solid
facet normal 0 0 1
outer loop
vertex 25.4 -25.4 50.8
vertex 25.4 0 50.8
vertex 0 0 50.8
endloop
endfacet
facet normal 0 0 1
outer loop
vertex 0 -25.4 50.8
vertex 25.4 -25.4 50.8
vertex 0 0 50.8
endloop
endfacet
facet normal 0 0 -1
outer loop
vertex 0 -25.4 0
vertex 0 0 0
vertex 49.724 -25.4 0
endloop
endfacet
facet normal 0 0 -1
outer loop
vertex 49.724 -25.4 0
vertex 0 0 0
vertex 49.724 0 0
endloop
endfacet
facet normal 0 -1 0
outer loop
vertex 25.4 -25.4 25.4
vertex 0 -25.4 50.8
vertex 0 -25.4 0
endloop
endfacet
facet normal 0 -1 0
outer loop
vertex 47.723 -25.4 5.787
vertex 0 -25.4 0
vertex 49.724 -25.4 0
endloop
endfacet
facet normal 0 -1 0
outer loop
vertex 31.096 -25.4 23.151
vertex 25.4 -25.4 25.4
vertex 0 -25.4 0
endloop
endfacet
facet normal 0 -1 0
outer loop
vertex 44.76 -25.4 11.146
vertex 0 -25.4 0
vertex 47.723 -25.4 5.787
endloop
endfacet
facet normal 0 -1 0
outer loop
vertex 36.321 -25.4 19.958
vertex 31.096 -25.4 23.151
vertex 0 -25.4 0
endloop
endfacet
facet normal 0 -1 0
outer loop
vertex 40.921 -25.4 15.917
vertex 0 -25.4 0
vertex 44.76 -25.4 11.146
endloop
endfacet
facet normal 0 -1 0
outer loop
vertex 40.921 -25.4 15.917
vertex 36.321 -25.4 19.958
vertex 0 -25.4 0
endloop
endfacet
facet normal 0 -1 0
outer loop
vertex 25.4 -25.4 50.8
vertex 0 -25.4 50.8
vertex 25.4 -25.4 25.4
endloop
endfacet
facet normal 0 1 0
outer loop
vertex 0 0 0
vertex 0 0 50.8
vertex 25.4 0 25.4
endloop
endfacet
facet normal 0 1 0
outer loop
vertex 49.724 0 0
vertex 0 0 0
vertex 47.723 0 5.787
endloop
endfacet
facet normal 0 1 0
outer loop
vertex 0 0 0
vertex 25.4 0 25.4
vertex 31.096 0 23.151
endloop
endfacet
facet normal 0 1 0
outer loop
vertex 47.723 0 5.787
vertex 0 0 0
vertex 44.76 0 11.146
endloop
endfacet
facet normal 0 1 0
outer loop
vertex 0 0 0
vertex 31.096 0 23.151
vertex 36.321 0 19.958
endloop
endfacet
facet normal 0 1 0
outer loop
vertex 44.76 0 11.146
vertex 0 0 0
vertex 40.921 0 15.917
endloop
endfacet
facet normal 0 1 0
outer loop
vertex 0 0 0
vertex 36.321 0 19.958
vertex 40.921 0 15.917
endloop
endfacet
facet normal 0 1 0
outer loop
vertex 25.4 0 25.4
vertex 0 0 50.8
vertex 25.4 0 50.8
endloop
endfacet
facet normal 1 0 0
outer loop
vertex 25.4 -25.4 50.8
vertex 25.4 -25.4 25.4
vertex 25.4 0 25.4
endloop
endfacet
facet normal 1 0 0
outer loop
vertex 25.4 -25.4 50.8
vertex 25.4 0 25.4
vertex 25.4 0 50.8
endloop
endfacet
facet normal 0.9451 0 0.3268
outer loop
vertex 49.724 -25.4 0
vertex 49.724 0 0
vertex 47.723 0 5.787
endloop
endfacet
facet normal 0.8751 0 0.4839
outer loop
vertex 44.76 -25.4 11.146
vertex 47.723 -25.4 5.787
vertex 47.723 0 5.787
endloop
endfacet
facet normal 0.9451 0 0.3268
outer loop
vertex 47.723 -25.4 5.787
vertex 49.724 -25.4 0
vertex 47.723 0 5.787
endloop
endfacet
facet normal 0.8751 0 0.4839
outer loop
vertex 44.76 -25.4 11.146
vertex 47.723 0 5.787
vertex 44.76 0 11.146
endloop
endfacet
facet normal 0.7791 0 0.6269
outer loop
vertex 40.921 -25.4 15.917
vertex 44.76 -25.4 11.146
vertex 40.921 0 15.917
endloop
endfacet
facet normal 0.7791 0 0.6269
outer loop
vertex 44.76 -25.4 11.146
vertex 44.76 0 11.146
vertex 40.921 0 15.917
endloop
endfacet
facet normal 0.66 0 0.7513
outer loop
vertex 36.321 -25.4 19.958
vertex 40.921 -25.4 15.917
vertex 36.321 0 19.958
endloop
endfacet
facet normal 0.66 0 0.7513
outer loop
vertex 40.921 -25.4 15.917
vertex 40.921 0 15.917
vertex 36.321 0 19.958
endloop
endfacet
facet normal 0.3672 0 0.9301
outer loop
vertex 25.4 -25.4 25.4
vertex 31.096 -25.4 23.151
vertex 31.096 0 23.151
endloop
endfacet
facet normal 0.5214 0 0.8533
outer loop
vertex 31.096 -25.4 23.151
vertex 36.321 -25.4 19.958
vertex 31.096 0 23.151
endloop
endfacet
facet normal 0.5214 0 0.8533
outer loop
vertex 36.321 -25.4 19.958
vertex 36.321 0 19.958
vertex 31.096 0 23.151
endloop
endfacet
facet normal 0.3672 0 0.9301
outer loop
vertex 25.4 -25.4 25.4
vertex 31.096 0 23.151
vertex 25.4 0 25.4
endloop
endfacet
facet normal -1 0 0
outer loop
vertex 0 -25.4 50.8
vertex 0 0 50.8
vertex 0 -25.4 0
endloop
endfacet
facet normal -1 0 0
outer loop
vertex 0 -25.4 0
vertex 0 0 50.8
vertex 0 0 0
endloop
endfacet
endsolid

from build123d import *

# Parameters (mm, degrees)
F1_DEPTH    = 25.4
F2_T1_DEPTH = 195.8114627457


# Not quite as in the source:
# - a fillet or chamfer that OpenCascade refuses, or shapes differently, is made with other operations: its cross-section is extruded or revolved along the edge and cut away or added


with BuildPart() as f1:
    # F0 (on Front) → F1 (new body)
    with BuildSketch(Plane.XZ):
        Polygon((0, 50.8), (0, 0), (50.8, 0), (50.8, 25.4), (25.4, 25.4), (25.4, 50.8), align=None)
    extrude(amount=F1_DEPTH)

    # F2: fillet of radius 35.5661942009 on 1 edges, made by hand

    # F2_s2 → F2_t1 (cut)
    with BuildSketch(Plane.XZ.offset(-85.2057313728)):
        with BuildLine():
            ThreePointArc((50.8, -8.6822925491), (43.7515810206, 12.5707229158), (25.4, 25.4))
            Line((25.4, 25.4), (25.603323884, 26.081645851))
            ThreePointArc((25.603323884, 26.081645851), (38.1, 26.111323884), (50.8, 26.111323884))
            Line((50.8, 26.111323884), (51.511323884, 25.4))
            Line((51.511323884, 25.4), (51.511323884, -8.6822925491))
            Line((51.511323884, -8.6822925491), (50.8, -8.6822925491))
        make_face()
    extrude(amount=F2_T1_DEPTH, mode=Mode.SUBTRACT)


solid = f1.part
